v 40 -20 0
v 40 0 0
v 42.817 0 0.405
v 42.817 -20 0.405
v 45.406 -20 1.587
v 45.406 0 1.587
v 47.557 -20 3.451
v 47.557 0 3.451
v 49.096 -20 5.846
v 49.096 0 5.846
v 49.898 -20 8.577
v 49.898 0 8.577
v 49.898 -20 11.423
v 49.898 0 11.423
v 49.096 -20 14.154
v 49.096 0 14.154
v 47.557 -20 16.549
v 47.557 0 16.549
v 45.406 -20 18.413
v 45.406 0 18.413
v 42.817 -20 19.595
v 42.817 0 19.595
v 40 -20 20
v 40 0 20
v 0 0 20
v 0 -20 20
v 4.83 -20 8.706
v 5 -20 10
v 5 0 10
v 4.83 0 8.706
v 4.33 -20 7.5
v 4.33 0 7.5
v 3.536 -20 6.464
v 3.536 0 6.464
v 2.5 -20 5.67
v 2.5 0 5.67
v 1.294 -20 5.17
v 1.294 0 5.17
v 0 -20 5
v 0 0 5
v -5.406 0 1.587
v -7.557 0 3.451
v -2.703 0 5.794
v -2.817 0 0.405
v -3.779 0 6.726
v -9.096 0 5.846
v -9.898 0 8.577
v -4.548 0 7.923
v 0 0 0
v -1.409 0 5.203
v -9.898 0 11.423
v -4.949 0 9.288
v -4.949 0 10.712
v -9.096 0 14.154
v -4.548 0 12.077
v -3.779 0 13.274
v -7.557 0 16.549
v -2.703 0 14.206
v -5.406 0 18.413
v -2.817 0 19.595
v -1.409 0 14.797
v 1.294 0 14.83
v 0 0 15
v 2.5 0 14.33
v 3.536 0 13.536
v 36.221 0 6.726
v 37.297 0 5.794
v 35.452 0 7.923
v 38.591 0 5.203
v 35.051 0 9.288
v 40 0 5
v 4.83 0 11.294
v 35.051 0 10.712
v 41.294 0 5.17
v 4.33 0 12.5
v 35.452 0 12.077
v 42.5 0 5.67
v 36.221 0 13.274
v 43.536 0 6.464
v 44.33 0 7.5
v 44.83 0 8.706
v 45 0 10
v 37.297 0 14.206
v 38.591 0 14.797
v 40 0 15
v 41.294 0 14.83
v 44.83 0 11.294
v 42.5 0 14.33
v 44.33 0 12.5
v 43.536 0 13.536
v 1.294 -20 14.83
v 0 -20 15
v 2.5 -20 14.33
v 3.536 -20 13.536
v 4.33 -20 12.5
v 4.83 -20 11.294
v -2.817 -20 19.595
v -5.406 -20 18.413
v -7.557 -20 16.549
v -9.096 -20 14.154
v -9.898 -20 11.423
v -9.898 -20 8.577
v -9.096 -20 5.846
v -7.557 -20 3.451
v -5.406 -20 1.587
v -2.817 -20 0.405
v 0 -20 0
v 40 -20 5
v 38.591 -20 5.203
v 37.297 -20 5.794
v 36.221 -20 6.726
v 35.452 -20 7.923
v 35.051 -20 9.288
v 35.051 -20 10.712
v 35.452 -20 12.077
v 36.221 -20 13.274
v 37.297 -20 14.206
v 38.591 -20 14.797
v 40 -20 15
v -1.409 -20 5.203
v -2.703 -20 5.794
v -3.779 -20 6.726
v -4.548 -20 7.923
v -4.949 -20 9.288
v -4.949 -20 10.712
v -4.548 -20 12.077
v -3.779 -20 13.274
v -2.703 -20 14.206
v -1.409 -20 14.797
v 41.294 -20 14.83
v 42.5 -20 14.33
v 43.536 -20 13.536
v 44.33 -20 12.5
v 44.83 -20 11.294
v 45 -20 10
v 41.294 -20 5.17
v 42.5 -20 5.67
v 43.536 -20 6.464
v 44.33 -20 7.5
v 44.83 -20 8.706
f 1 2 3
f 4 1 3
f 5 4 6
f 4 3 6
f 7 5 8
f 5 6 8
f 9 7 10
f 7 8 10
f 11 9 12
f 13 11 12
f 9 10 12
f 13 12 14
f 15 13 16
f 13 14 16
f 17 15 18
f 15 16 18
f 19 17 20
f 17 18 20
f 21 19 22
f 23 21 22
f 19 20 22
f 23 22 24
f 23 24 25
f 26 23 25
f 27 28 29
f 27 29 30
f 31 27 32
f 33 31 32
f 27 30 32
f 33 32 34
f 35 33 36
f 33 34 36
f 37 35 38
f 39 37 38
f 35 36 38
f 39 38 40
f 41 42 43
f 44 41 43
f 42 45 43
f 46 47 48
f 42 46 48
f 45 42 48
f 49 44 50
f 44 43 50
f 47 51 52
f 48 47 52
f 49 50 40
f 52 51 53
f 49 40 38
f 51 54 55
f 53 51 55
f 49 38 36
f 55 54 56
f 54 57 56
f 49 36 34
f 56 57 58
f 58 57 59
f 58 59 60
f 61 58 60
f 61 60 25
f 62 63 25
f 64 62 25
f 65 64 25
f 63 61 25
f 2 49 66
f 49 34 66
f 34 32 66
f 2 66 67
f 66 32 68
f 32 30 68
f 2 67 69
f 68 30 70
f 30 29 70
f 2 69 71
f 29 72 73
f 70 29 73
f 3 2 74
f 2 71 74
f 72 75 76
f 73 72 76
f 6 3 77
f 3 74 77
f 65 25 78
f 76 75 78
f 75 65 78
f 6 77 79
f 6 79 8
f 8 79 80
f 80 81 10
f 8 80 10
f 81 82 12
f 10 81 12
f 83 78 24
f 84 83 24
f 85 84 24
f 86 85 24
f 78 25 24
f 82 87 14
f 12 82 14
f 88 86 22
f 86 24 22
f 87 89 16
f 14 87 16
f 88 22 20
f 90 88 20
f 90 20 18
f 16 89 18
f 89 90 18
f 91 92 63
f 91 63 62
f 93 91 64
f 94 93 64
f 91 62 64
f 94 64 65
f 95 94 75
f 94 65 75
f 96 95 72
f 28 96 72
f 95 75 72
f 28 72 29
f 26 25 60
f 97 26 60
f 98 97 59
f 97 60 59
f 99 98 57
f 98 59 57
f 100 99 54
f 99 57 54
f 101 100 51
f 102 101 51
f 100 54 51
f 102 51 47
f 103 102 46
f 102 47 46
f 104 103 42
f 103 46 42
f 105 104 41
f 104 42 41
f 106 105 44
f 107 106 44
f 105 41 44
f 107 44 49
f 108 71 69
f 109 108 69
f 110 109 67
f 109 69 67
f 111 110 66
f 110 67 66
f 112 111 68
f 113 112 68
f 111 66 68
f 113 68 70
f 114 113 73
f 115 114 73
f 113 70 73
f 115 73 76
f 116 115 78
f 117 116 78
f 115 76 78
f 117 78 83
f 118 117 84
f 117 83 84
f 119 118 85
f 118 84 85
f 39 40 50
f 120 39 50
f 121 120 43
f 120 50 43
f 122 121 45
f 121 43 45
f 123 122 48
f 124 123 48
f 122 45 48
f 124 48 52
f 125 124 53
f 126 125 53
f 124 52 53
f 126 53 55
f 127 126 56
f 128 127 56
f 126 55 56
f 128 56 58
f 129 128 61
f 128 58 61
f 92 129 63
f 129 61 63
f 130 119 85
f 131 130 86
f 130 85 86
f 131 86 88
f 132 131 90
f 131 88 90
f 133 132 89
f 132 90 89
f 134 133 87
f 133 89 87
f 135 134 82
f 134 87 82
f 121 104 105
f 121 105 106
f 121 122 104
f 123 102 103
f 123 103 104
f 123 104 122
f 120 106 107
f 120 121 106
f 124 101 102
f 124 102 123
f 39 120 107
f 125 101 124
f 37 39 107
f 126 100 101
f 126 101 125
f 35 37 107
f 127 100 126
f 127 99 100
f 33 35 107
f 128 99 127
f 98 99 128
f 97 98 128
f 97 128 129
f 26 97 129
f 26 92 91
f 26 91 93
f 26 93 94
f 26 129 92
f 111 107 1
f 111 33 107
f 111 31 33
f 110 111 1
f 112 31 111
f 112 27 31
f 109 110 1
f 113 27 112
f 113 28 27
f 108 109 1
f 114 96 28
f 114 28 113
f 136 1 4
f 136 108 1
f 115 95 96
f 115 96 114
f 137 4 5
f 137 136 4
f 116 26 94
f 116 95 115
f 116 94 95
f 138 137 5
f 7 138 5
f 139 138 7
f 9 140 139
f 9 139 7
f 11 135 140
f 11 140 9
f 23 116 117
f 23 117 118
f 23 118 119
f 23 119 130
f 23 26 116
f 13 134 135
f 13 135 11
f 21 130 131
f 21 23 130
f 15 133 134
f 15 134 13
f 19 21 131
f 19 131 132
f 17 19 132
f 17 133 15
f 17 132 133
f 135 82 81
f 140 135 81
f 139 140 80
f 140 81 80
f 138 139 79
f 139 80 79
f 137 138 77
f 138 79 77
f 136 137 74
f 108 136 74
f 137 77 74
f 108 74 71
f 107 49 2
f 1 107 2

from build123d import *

# Parameters (mm, degrees)
F1_DEPTH = 20


with BuildPart() as f1:
    # F0 (on Front) → F1 (new body)
    with BuildSketch(Plane.XZ):
        with BuildLine():
            Line((0, 5), (0, 0))
            Line((0, 0), (40, 0))
            Line((40, 0), (40, 5))
            ThreePointArc((40, 5), (35, 10), (40, 15))
            Line((40, 15), (40, 20))
            Line((40, 20), (0, 20))
            Line((0, 20), (0, 15))
            ThreePointArc((0, 15), (3.535534, 13.535534), (5, 10))
            ThreePointArc((5, 10), (3.535534, 6.464466), (0, 5))
        make_face()
        with BuildLine():
            ThreePointArc((0, 20), (-10, 10), (0, 0))
            Line((0, 0), (0, 5))
            ThreePointArc((0, 5), (-5, 10), (0, 15))
            Line((0, 15), (0, 20))
        make_face()
        with BuildLine():
            Line((40, 5), (40, 0))
            ThreePointArc((40, 0), (50, 10), (40, 20))
            Line((40, 20), (40, 15))
            ThreePointArc((40, 15), (43.535534, 13.535534), (45, 10))
            ThreePointArc((45, 10), (43.535534, 6.464466), (40, 5))
        make_face()
    extrude(amount=F1_DEPTH)


solid = f1.part
